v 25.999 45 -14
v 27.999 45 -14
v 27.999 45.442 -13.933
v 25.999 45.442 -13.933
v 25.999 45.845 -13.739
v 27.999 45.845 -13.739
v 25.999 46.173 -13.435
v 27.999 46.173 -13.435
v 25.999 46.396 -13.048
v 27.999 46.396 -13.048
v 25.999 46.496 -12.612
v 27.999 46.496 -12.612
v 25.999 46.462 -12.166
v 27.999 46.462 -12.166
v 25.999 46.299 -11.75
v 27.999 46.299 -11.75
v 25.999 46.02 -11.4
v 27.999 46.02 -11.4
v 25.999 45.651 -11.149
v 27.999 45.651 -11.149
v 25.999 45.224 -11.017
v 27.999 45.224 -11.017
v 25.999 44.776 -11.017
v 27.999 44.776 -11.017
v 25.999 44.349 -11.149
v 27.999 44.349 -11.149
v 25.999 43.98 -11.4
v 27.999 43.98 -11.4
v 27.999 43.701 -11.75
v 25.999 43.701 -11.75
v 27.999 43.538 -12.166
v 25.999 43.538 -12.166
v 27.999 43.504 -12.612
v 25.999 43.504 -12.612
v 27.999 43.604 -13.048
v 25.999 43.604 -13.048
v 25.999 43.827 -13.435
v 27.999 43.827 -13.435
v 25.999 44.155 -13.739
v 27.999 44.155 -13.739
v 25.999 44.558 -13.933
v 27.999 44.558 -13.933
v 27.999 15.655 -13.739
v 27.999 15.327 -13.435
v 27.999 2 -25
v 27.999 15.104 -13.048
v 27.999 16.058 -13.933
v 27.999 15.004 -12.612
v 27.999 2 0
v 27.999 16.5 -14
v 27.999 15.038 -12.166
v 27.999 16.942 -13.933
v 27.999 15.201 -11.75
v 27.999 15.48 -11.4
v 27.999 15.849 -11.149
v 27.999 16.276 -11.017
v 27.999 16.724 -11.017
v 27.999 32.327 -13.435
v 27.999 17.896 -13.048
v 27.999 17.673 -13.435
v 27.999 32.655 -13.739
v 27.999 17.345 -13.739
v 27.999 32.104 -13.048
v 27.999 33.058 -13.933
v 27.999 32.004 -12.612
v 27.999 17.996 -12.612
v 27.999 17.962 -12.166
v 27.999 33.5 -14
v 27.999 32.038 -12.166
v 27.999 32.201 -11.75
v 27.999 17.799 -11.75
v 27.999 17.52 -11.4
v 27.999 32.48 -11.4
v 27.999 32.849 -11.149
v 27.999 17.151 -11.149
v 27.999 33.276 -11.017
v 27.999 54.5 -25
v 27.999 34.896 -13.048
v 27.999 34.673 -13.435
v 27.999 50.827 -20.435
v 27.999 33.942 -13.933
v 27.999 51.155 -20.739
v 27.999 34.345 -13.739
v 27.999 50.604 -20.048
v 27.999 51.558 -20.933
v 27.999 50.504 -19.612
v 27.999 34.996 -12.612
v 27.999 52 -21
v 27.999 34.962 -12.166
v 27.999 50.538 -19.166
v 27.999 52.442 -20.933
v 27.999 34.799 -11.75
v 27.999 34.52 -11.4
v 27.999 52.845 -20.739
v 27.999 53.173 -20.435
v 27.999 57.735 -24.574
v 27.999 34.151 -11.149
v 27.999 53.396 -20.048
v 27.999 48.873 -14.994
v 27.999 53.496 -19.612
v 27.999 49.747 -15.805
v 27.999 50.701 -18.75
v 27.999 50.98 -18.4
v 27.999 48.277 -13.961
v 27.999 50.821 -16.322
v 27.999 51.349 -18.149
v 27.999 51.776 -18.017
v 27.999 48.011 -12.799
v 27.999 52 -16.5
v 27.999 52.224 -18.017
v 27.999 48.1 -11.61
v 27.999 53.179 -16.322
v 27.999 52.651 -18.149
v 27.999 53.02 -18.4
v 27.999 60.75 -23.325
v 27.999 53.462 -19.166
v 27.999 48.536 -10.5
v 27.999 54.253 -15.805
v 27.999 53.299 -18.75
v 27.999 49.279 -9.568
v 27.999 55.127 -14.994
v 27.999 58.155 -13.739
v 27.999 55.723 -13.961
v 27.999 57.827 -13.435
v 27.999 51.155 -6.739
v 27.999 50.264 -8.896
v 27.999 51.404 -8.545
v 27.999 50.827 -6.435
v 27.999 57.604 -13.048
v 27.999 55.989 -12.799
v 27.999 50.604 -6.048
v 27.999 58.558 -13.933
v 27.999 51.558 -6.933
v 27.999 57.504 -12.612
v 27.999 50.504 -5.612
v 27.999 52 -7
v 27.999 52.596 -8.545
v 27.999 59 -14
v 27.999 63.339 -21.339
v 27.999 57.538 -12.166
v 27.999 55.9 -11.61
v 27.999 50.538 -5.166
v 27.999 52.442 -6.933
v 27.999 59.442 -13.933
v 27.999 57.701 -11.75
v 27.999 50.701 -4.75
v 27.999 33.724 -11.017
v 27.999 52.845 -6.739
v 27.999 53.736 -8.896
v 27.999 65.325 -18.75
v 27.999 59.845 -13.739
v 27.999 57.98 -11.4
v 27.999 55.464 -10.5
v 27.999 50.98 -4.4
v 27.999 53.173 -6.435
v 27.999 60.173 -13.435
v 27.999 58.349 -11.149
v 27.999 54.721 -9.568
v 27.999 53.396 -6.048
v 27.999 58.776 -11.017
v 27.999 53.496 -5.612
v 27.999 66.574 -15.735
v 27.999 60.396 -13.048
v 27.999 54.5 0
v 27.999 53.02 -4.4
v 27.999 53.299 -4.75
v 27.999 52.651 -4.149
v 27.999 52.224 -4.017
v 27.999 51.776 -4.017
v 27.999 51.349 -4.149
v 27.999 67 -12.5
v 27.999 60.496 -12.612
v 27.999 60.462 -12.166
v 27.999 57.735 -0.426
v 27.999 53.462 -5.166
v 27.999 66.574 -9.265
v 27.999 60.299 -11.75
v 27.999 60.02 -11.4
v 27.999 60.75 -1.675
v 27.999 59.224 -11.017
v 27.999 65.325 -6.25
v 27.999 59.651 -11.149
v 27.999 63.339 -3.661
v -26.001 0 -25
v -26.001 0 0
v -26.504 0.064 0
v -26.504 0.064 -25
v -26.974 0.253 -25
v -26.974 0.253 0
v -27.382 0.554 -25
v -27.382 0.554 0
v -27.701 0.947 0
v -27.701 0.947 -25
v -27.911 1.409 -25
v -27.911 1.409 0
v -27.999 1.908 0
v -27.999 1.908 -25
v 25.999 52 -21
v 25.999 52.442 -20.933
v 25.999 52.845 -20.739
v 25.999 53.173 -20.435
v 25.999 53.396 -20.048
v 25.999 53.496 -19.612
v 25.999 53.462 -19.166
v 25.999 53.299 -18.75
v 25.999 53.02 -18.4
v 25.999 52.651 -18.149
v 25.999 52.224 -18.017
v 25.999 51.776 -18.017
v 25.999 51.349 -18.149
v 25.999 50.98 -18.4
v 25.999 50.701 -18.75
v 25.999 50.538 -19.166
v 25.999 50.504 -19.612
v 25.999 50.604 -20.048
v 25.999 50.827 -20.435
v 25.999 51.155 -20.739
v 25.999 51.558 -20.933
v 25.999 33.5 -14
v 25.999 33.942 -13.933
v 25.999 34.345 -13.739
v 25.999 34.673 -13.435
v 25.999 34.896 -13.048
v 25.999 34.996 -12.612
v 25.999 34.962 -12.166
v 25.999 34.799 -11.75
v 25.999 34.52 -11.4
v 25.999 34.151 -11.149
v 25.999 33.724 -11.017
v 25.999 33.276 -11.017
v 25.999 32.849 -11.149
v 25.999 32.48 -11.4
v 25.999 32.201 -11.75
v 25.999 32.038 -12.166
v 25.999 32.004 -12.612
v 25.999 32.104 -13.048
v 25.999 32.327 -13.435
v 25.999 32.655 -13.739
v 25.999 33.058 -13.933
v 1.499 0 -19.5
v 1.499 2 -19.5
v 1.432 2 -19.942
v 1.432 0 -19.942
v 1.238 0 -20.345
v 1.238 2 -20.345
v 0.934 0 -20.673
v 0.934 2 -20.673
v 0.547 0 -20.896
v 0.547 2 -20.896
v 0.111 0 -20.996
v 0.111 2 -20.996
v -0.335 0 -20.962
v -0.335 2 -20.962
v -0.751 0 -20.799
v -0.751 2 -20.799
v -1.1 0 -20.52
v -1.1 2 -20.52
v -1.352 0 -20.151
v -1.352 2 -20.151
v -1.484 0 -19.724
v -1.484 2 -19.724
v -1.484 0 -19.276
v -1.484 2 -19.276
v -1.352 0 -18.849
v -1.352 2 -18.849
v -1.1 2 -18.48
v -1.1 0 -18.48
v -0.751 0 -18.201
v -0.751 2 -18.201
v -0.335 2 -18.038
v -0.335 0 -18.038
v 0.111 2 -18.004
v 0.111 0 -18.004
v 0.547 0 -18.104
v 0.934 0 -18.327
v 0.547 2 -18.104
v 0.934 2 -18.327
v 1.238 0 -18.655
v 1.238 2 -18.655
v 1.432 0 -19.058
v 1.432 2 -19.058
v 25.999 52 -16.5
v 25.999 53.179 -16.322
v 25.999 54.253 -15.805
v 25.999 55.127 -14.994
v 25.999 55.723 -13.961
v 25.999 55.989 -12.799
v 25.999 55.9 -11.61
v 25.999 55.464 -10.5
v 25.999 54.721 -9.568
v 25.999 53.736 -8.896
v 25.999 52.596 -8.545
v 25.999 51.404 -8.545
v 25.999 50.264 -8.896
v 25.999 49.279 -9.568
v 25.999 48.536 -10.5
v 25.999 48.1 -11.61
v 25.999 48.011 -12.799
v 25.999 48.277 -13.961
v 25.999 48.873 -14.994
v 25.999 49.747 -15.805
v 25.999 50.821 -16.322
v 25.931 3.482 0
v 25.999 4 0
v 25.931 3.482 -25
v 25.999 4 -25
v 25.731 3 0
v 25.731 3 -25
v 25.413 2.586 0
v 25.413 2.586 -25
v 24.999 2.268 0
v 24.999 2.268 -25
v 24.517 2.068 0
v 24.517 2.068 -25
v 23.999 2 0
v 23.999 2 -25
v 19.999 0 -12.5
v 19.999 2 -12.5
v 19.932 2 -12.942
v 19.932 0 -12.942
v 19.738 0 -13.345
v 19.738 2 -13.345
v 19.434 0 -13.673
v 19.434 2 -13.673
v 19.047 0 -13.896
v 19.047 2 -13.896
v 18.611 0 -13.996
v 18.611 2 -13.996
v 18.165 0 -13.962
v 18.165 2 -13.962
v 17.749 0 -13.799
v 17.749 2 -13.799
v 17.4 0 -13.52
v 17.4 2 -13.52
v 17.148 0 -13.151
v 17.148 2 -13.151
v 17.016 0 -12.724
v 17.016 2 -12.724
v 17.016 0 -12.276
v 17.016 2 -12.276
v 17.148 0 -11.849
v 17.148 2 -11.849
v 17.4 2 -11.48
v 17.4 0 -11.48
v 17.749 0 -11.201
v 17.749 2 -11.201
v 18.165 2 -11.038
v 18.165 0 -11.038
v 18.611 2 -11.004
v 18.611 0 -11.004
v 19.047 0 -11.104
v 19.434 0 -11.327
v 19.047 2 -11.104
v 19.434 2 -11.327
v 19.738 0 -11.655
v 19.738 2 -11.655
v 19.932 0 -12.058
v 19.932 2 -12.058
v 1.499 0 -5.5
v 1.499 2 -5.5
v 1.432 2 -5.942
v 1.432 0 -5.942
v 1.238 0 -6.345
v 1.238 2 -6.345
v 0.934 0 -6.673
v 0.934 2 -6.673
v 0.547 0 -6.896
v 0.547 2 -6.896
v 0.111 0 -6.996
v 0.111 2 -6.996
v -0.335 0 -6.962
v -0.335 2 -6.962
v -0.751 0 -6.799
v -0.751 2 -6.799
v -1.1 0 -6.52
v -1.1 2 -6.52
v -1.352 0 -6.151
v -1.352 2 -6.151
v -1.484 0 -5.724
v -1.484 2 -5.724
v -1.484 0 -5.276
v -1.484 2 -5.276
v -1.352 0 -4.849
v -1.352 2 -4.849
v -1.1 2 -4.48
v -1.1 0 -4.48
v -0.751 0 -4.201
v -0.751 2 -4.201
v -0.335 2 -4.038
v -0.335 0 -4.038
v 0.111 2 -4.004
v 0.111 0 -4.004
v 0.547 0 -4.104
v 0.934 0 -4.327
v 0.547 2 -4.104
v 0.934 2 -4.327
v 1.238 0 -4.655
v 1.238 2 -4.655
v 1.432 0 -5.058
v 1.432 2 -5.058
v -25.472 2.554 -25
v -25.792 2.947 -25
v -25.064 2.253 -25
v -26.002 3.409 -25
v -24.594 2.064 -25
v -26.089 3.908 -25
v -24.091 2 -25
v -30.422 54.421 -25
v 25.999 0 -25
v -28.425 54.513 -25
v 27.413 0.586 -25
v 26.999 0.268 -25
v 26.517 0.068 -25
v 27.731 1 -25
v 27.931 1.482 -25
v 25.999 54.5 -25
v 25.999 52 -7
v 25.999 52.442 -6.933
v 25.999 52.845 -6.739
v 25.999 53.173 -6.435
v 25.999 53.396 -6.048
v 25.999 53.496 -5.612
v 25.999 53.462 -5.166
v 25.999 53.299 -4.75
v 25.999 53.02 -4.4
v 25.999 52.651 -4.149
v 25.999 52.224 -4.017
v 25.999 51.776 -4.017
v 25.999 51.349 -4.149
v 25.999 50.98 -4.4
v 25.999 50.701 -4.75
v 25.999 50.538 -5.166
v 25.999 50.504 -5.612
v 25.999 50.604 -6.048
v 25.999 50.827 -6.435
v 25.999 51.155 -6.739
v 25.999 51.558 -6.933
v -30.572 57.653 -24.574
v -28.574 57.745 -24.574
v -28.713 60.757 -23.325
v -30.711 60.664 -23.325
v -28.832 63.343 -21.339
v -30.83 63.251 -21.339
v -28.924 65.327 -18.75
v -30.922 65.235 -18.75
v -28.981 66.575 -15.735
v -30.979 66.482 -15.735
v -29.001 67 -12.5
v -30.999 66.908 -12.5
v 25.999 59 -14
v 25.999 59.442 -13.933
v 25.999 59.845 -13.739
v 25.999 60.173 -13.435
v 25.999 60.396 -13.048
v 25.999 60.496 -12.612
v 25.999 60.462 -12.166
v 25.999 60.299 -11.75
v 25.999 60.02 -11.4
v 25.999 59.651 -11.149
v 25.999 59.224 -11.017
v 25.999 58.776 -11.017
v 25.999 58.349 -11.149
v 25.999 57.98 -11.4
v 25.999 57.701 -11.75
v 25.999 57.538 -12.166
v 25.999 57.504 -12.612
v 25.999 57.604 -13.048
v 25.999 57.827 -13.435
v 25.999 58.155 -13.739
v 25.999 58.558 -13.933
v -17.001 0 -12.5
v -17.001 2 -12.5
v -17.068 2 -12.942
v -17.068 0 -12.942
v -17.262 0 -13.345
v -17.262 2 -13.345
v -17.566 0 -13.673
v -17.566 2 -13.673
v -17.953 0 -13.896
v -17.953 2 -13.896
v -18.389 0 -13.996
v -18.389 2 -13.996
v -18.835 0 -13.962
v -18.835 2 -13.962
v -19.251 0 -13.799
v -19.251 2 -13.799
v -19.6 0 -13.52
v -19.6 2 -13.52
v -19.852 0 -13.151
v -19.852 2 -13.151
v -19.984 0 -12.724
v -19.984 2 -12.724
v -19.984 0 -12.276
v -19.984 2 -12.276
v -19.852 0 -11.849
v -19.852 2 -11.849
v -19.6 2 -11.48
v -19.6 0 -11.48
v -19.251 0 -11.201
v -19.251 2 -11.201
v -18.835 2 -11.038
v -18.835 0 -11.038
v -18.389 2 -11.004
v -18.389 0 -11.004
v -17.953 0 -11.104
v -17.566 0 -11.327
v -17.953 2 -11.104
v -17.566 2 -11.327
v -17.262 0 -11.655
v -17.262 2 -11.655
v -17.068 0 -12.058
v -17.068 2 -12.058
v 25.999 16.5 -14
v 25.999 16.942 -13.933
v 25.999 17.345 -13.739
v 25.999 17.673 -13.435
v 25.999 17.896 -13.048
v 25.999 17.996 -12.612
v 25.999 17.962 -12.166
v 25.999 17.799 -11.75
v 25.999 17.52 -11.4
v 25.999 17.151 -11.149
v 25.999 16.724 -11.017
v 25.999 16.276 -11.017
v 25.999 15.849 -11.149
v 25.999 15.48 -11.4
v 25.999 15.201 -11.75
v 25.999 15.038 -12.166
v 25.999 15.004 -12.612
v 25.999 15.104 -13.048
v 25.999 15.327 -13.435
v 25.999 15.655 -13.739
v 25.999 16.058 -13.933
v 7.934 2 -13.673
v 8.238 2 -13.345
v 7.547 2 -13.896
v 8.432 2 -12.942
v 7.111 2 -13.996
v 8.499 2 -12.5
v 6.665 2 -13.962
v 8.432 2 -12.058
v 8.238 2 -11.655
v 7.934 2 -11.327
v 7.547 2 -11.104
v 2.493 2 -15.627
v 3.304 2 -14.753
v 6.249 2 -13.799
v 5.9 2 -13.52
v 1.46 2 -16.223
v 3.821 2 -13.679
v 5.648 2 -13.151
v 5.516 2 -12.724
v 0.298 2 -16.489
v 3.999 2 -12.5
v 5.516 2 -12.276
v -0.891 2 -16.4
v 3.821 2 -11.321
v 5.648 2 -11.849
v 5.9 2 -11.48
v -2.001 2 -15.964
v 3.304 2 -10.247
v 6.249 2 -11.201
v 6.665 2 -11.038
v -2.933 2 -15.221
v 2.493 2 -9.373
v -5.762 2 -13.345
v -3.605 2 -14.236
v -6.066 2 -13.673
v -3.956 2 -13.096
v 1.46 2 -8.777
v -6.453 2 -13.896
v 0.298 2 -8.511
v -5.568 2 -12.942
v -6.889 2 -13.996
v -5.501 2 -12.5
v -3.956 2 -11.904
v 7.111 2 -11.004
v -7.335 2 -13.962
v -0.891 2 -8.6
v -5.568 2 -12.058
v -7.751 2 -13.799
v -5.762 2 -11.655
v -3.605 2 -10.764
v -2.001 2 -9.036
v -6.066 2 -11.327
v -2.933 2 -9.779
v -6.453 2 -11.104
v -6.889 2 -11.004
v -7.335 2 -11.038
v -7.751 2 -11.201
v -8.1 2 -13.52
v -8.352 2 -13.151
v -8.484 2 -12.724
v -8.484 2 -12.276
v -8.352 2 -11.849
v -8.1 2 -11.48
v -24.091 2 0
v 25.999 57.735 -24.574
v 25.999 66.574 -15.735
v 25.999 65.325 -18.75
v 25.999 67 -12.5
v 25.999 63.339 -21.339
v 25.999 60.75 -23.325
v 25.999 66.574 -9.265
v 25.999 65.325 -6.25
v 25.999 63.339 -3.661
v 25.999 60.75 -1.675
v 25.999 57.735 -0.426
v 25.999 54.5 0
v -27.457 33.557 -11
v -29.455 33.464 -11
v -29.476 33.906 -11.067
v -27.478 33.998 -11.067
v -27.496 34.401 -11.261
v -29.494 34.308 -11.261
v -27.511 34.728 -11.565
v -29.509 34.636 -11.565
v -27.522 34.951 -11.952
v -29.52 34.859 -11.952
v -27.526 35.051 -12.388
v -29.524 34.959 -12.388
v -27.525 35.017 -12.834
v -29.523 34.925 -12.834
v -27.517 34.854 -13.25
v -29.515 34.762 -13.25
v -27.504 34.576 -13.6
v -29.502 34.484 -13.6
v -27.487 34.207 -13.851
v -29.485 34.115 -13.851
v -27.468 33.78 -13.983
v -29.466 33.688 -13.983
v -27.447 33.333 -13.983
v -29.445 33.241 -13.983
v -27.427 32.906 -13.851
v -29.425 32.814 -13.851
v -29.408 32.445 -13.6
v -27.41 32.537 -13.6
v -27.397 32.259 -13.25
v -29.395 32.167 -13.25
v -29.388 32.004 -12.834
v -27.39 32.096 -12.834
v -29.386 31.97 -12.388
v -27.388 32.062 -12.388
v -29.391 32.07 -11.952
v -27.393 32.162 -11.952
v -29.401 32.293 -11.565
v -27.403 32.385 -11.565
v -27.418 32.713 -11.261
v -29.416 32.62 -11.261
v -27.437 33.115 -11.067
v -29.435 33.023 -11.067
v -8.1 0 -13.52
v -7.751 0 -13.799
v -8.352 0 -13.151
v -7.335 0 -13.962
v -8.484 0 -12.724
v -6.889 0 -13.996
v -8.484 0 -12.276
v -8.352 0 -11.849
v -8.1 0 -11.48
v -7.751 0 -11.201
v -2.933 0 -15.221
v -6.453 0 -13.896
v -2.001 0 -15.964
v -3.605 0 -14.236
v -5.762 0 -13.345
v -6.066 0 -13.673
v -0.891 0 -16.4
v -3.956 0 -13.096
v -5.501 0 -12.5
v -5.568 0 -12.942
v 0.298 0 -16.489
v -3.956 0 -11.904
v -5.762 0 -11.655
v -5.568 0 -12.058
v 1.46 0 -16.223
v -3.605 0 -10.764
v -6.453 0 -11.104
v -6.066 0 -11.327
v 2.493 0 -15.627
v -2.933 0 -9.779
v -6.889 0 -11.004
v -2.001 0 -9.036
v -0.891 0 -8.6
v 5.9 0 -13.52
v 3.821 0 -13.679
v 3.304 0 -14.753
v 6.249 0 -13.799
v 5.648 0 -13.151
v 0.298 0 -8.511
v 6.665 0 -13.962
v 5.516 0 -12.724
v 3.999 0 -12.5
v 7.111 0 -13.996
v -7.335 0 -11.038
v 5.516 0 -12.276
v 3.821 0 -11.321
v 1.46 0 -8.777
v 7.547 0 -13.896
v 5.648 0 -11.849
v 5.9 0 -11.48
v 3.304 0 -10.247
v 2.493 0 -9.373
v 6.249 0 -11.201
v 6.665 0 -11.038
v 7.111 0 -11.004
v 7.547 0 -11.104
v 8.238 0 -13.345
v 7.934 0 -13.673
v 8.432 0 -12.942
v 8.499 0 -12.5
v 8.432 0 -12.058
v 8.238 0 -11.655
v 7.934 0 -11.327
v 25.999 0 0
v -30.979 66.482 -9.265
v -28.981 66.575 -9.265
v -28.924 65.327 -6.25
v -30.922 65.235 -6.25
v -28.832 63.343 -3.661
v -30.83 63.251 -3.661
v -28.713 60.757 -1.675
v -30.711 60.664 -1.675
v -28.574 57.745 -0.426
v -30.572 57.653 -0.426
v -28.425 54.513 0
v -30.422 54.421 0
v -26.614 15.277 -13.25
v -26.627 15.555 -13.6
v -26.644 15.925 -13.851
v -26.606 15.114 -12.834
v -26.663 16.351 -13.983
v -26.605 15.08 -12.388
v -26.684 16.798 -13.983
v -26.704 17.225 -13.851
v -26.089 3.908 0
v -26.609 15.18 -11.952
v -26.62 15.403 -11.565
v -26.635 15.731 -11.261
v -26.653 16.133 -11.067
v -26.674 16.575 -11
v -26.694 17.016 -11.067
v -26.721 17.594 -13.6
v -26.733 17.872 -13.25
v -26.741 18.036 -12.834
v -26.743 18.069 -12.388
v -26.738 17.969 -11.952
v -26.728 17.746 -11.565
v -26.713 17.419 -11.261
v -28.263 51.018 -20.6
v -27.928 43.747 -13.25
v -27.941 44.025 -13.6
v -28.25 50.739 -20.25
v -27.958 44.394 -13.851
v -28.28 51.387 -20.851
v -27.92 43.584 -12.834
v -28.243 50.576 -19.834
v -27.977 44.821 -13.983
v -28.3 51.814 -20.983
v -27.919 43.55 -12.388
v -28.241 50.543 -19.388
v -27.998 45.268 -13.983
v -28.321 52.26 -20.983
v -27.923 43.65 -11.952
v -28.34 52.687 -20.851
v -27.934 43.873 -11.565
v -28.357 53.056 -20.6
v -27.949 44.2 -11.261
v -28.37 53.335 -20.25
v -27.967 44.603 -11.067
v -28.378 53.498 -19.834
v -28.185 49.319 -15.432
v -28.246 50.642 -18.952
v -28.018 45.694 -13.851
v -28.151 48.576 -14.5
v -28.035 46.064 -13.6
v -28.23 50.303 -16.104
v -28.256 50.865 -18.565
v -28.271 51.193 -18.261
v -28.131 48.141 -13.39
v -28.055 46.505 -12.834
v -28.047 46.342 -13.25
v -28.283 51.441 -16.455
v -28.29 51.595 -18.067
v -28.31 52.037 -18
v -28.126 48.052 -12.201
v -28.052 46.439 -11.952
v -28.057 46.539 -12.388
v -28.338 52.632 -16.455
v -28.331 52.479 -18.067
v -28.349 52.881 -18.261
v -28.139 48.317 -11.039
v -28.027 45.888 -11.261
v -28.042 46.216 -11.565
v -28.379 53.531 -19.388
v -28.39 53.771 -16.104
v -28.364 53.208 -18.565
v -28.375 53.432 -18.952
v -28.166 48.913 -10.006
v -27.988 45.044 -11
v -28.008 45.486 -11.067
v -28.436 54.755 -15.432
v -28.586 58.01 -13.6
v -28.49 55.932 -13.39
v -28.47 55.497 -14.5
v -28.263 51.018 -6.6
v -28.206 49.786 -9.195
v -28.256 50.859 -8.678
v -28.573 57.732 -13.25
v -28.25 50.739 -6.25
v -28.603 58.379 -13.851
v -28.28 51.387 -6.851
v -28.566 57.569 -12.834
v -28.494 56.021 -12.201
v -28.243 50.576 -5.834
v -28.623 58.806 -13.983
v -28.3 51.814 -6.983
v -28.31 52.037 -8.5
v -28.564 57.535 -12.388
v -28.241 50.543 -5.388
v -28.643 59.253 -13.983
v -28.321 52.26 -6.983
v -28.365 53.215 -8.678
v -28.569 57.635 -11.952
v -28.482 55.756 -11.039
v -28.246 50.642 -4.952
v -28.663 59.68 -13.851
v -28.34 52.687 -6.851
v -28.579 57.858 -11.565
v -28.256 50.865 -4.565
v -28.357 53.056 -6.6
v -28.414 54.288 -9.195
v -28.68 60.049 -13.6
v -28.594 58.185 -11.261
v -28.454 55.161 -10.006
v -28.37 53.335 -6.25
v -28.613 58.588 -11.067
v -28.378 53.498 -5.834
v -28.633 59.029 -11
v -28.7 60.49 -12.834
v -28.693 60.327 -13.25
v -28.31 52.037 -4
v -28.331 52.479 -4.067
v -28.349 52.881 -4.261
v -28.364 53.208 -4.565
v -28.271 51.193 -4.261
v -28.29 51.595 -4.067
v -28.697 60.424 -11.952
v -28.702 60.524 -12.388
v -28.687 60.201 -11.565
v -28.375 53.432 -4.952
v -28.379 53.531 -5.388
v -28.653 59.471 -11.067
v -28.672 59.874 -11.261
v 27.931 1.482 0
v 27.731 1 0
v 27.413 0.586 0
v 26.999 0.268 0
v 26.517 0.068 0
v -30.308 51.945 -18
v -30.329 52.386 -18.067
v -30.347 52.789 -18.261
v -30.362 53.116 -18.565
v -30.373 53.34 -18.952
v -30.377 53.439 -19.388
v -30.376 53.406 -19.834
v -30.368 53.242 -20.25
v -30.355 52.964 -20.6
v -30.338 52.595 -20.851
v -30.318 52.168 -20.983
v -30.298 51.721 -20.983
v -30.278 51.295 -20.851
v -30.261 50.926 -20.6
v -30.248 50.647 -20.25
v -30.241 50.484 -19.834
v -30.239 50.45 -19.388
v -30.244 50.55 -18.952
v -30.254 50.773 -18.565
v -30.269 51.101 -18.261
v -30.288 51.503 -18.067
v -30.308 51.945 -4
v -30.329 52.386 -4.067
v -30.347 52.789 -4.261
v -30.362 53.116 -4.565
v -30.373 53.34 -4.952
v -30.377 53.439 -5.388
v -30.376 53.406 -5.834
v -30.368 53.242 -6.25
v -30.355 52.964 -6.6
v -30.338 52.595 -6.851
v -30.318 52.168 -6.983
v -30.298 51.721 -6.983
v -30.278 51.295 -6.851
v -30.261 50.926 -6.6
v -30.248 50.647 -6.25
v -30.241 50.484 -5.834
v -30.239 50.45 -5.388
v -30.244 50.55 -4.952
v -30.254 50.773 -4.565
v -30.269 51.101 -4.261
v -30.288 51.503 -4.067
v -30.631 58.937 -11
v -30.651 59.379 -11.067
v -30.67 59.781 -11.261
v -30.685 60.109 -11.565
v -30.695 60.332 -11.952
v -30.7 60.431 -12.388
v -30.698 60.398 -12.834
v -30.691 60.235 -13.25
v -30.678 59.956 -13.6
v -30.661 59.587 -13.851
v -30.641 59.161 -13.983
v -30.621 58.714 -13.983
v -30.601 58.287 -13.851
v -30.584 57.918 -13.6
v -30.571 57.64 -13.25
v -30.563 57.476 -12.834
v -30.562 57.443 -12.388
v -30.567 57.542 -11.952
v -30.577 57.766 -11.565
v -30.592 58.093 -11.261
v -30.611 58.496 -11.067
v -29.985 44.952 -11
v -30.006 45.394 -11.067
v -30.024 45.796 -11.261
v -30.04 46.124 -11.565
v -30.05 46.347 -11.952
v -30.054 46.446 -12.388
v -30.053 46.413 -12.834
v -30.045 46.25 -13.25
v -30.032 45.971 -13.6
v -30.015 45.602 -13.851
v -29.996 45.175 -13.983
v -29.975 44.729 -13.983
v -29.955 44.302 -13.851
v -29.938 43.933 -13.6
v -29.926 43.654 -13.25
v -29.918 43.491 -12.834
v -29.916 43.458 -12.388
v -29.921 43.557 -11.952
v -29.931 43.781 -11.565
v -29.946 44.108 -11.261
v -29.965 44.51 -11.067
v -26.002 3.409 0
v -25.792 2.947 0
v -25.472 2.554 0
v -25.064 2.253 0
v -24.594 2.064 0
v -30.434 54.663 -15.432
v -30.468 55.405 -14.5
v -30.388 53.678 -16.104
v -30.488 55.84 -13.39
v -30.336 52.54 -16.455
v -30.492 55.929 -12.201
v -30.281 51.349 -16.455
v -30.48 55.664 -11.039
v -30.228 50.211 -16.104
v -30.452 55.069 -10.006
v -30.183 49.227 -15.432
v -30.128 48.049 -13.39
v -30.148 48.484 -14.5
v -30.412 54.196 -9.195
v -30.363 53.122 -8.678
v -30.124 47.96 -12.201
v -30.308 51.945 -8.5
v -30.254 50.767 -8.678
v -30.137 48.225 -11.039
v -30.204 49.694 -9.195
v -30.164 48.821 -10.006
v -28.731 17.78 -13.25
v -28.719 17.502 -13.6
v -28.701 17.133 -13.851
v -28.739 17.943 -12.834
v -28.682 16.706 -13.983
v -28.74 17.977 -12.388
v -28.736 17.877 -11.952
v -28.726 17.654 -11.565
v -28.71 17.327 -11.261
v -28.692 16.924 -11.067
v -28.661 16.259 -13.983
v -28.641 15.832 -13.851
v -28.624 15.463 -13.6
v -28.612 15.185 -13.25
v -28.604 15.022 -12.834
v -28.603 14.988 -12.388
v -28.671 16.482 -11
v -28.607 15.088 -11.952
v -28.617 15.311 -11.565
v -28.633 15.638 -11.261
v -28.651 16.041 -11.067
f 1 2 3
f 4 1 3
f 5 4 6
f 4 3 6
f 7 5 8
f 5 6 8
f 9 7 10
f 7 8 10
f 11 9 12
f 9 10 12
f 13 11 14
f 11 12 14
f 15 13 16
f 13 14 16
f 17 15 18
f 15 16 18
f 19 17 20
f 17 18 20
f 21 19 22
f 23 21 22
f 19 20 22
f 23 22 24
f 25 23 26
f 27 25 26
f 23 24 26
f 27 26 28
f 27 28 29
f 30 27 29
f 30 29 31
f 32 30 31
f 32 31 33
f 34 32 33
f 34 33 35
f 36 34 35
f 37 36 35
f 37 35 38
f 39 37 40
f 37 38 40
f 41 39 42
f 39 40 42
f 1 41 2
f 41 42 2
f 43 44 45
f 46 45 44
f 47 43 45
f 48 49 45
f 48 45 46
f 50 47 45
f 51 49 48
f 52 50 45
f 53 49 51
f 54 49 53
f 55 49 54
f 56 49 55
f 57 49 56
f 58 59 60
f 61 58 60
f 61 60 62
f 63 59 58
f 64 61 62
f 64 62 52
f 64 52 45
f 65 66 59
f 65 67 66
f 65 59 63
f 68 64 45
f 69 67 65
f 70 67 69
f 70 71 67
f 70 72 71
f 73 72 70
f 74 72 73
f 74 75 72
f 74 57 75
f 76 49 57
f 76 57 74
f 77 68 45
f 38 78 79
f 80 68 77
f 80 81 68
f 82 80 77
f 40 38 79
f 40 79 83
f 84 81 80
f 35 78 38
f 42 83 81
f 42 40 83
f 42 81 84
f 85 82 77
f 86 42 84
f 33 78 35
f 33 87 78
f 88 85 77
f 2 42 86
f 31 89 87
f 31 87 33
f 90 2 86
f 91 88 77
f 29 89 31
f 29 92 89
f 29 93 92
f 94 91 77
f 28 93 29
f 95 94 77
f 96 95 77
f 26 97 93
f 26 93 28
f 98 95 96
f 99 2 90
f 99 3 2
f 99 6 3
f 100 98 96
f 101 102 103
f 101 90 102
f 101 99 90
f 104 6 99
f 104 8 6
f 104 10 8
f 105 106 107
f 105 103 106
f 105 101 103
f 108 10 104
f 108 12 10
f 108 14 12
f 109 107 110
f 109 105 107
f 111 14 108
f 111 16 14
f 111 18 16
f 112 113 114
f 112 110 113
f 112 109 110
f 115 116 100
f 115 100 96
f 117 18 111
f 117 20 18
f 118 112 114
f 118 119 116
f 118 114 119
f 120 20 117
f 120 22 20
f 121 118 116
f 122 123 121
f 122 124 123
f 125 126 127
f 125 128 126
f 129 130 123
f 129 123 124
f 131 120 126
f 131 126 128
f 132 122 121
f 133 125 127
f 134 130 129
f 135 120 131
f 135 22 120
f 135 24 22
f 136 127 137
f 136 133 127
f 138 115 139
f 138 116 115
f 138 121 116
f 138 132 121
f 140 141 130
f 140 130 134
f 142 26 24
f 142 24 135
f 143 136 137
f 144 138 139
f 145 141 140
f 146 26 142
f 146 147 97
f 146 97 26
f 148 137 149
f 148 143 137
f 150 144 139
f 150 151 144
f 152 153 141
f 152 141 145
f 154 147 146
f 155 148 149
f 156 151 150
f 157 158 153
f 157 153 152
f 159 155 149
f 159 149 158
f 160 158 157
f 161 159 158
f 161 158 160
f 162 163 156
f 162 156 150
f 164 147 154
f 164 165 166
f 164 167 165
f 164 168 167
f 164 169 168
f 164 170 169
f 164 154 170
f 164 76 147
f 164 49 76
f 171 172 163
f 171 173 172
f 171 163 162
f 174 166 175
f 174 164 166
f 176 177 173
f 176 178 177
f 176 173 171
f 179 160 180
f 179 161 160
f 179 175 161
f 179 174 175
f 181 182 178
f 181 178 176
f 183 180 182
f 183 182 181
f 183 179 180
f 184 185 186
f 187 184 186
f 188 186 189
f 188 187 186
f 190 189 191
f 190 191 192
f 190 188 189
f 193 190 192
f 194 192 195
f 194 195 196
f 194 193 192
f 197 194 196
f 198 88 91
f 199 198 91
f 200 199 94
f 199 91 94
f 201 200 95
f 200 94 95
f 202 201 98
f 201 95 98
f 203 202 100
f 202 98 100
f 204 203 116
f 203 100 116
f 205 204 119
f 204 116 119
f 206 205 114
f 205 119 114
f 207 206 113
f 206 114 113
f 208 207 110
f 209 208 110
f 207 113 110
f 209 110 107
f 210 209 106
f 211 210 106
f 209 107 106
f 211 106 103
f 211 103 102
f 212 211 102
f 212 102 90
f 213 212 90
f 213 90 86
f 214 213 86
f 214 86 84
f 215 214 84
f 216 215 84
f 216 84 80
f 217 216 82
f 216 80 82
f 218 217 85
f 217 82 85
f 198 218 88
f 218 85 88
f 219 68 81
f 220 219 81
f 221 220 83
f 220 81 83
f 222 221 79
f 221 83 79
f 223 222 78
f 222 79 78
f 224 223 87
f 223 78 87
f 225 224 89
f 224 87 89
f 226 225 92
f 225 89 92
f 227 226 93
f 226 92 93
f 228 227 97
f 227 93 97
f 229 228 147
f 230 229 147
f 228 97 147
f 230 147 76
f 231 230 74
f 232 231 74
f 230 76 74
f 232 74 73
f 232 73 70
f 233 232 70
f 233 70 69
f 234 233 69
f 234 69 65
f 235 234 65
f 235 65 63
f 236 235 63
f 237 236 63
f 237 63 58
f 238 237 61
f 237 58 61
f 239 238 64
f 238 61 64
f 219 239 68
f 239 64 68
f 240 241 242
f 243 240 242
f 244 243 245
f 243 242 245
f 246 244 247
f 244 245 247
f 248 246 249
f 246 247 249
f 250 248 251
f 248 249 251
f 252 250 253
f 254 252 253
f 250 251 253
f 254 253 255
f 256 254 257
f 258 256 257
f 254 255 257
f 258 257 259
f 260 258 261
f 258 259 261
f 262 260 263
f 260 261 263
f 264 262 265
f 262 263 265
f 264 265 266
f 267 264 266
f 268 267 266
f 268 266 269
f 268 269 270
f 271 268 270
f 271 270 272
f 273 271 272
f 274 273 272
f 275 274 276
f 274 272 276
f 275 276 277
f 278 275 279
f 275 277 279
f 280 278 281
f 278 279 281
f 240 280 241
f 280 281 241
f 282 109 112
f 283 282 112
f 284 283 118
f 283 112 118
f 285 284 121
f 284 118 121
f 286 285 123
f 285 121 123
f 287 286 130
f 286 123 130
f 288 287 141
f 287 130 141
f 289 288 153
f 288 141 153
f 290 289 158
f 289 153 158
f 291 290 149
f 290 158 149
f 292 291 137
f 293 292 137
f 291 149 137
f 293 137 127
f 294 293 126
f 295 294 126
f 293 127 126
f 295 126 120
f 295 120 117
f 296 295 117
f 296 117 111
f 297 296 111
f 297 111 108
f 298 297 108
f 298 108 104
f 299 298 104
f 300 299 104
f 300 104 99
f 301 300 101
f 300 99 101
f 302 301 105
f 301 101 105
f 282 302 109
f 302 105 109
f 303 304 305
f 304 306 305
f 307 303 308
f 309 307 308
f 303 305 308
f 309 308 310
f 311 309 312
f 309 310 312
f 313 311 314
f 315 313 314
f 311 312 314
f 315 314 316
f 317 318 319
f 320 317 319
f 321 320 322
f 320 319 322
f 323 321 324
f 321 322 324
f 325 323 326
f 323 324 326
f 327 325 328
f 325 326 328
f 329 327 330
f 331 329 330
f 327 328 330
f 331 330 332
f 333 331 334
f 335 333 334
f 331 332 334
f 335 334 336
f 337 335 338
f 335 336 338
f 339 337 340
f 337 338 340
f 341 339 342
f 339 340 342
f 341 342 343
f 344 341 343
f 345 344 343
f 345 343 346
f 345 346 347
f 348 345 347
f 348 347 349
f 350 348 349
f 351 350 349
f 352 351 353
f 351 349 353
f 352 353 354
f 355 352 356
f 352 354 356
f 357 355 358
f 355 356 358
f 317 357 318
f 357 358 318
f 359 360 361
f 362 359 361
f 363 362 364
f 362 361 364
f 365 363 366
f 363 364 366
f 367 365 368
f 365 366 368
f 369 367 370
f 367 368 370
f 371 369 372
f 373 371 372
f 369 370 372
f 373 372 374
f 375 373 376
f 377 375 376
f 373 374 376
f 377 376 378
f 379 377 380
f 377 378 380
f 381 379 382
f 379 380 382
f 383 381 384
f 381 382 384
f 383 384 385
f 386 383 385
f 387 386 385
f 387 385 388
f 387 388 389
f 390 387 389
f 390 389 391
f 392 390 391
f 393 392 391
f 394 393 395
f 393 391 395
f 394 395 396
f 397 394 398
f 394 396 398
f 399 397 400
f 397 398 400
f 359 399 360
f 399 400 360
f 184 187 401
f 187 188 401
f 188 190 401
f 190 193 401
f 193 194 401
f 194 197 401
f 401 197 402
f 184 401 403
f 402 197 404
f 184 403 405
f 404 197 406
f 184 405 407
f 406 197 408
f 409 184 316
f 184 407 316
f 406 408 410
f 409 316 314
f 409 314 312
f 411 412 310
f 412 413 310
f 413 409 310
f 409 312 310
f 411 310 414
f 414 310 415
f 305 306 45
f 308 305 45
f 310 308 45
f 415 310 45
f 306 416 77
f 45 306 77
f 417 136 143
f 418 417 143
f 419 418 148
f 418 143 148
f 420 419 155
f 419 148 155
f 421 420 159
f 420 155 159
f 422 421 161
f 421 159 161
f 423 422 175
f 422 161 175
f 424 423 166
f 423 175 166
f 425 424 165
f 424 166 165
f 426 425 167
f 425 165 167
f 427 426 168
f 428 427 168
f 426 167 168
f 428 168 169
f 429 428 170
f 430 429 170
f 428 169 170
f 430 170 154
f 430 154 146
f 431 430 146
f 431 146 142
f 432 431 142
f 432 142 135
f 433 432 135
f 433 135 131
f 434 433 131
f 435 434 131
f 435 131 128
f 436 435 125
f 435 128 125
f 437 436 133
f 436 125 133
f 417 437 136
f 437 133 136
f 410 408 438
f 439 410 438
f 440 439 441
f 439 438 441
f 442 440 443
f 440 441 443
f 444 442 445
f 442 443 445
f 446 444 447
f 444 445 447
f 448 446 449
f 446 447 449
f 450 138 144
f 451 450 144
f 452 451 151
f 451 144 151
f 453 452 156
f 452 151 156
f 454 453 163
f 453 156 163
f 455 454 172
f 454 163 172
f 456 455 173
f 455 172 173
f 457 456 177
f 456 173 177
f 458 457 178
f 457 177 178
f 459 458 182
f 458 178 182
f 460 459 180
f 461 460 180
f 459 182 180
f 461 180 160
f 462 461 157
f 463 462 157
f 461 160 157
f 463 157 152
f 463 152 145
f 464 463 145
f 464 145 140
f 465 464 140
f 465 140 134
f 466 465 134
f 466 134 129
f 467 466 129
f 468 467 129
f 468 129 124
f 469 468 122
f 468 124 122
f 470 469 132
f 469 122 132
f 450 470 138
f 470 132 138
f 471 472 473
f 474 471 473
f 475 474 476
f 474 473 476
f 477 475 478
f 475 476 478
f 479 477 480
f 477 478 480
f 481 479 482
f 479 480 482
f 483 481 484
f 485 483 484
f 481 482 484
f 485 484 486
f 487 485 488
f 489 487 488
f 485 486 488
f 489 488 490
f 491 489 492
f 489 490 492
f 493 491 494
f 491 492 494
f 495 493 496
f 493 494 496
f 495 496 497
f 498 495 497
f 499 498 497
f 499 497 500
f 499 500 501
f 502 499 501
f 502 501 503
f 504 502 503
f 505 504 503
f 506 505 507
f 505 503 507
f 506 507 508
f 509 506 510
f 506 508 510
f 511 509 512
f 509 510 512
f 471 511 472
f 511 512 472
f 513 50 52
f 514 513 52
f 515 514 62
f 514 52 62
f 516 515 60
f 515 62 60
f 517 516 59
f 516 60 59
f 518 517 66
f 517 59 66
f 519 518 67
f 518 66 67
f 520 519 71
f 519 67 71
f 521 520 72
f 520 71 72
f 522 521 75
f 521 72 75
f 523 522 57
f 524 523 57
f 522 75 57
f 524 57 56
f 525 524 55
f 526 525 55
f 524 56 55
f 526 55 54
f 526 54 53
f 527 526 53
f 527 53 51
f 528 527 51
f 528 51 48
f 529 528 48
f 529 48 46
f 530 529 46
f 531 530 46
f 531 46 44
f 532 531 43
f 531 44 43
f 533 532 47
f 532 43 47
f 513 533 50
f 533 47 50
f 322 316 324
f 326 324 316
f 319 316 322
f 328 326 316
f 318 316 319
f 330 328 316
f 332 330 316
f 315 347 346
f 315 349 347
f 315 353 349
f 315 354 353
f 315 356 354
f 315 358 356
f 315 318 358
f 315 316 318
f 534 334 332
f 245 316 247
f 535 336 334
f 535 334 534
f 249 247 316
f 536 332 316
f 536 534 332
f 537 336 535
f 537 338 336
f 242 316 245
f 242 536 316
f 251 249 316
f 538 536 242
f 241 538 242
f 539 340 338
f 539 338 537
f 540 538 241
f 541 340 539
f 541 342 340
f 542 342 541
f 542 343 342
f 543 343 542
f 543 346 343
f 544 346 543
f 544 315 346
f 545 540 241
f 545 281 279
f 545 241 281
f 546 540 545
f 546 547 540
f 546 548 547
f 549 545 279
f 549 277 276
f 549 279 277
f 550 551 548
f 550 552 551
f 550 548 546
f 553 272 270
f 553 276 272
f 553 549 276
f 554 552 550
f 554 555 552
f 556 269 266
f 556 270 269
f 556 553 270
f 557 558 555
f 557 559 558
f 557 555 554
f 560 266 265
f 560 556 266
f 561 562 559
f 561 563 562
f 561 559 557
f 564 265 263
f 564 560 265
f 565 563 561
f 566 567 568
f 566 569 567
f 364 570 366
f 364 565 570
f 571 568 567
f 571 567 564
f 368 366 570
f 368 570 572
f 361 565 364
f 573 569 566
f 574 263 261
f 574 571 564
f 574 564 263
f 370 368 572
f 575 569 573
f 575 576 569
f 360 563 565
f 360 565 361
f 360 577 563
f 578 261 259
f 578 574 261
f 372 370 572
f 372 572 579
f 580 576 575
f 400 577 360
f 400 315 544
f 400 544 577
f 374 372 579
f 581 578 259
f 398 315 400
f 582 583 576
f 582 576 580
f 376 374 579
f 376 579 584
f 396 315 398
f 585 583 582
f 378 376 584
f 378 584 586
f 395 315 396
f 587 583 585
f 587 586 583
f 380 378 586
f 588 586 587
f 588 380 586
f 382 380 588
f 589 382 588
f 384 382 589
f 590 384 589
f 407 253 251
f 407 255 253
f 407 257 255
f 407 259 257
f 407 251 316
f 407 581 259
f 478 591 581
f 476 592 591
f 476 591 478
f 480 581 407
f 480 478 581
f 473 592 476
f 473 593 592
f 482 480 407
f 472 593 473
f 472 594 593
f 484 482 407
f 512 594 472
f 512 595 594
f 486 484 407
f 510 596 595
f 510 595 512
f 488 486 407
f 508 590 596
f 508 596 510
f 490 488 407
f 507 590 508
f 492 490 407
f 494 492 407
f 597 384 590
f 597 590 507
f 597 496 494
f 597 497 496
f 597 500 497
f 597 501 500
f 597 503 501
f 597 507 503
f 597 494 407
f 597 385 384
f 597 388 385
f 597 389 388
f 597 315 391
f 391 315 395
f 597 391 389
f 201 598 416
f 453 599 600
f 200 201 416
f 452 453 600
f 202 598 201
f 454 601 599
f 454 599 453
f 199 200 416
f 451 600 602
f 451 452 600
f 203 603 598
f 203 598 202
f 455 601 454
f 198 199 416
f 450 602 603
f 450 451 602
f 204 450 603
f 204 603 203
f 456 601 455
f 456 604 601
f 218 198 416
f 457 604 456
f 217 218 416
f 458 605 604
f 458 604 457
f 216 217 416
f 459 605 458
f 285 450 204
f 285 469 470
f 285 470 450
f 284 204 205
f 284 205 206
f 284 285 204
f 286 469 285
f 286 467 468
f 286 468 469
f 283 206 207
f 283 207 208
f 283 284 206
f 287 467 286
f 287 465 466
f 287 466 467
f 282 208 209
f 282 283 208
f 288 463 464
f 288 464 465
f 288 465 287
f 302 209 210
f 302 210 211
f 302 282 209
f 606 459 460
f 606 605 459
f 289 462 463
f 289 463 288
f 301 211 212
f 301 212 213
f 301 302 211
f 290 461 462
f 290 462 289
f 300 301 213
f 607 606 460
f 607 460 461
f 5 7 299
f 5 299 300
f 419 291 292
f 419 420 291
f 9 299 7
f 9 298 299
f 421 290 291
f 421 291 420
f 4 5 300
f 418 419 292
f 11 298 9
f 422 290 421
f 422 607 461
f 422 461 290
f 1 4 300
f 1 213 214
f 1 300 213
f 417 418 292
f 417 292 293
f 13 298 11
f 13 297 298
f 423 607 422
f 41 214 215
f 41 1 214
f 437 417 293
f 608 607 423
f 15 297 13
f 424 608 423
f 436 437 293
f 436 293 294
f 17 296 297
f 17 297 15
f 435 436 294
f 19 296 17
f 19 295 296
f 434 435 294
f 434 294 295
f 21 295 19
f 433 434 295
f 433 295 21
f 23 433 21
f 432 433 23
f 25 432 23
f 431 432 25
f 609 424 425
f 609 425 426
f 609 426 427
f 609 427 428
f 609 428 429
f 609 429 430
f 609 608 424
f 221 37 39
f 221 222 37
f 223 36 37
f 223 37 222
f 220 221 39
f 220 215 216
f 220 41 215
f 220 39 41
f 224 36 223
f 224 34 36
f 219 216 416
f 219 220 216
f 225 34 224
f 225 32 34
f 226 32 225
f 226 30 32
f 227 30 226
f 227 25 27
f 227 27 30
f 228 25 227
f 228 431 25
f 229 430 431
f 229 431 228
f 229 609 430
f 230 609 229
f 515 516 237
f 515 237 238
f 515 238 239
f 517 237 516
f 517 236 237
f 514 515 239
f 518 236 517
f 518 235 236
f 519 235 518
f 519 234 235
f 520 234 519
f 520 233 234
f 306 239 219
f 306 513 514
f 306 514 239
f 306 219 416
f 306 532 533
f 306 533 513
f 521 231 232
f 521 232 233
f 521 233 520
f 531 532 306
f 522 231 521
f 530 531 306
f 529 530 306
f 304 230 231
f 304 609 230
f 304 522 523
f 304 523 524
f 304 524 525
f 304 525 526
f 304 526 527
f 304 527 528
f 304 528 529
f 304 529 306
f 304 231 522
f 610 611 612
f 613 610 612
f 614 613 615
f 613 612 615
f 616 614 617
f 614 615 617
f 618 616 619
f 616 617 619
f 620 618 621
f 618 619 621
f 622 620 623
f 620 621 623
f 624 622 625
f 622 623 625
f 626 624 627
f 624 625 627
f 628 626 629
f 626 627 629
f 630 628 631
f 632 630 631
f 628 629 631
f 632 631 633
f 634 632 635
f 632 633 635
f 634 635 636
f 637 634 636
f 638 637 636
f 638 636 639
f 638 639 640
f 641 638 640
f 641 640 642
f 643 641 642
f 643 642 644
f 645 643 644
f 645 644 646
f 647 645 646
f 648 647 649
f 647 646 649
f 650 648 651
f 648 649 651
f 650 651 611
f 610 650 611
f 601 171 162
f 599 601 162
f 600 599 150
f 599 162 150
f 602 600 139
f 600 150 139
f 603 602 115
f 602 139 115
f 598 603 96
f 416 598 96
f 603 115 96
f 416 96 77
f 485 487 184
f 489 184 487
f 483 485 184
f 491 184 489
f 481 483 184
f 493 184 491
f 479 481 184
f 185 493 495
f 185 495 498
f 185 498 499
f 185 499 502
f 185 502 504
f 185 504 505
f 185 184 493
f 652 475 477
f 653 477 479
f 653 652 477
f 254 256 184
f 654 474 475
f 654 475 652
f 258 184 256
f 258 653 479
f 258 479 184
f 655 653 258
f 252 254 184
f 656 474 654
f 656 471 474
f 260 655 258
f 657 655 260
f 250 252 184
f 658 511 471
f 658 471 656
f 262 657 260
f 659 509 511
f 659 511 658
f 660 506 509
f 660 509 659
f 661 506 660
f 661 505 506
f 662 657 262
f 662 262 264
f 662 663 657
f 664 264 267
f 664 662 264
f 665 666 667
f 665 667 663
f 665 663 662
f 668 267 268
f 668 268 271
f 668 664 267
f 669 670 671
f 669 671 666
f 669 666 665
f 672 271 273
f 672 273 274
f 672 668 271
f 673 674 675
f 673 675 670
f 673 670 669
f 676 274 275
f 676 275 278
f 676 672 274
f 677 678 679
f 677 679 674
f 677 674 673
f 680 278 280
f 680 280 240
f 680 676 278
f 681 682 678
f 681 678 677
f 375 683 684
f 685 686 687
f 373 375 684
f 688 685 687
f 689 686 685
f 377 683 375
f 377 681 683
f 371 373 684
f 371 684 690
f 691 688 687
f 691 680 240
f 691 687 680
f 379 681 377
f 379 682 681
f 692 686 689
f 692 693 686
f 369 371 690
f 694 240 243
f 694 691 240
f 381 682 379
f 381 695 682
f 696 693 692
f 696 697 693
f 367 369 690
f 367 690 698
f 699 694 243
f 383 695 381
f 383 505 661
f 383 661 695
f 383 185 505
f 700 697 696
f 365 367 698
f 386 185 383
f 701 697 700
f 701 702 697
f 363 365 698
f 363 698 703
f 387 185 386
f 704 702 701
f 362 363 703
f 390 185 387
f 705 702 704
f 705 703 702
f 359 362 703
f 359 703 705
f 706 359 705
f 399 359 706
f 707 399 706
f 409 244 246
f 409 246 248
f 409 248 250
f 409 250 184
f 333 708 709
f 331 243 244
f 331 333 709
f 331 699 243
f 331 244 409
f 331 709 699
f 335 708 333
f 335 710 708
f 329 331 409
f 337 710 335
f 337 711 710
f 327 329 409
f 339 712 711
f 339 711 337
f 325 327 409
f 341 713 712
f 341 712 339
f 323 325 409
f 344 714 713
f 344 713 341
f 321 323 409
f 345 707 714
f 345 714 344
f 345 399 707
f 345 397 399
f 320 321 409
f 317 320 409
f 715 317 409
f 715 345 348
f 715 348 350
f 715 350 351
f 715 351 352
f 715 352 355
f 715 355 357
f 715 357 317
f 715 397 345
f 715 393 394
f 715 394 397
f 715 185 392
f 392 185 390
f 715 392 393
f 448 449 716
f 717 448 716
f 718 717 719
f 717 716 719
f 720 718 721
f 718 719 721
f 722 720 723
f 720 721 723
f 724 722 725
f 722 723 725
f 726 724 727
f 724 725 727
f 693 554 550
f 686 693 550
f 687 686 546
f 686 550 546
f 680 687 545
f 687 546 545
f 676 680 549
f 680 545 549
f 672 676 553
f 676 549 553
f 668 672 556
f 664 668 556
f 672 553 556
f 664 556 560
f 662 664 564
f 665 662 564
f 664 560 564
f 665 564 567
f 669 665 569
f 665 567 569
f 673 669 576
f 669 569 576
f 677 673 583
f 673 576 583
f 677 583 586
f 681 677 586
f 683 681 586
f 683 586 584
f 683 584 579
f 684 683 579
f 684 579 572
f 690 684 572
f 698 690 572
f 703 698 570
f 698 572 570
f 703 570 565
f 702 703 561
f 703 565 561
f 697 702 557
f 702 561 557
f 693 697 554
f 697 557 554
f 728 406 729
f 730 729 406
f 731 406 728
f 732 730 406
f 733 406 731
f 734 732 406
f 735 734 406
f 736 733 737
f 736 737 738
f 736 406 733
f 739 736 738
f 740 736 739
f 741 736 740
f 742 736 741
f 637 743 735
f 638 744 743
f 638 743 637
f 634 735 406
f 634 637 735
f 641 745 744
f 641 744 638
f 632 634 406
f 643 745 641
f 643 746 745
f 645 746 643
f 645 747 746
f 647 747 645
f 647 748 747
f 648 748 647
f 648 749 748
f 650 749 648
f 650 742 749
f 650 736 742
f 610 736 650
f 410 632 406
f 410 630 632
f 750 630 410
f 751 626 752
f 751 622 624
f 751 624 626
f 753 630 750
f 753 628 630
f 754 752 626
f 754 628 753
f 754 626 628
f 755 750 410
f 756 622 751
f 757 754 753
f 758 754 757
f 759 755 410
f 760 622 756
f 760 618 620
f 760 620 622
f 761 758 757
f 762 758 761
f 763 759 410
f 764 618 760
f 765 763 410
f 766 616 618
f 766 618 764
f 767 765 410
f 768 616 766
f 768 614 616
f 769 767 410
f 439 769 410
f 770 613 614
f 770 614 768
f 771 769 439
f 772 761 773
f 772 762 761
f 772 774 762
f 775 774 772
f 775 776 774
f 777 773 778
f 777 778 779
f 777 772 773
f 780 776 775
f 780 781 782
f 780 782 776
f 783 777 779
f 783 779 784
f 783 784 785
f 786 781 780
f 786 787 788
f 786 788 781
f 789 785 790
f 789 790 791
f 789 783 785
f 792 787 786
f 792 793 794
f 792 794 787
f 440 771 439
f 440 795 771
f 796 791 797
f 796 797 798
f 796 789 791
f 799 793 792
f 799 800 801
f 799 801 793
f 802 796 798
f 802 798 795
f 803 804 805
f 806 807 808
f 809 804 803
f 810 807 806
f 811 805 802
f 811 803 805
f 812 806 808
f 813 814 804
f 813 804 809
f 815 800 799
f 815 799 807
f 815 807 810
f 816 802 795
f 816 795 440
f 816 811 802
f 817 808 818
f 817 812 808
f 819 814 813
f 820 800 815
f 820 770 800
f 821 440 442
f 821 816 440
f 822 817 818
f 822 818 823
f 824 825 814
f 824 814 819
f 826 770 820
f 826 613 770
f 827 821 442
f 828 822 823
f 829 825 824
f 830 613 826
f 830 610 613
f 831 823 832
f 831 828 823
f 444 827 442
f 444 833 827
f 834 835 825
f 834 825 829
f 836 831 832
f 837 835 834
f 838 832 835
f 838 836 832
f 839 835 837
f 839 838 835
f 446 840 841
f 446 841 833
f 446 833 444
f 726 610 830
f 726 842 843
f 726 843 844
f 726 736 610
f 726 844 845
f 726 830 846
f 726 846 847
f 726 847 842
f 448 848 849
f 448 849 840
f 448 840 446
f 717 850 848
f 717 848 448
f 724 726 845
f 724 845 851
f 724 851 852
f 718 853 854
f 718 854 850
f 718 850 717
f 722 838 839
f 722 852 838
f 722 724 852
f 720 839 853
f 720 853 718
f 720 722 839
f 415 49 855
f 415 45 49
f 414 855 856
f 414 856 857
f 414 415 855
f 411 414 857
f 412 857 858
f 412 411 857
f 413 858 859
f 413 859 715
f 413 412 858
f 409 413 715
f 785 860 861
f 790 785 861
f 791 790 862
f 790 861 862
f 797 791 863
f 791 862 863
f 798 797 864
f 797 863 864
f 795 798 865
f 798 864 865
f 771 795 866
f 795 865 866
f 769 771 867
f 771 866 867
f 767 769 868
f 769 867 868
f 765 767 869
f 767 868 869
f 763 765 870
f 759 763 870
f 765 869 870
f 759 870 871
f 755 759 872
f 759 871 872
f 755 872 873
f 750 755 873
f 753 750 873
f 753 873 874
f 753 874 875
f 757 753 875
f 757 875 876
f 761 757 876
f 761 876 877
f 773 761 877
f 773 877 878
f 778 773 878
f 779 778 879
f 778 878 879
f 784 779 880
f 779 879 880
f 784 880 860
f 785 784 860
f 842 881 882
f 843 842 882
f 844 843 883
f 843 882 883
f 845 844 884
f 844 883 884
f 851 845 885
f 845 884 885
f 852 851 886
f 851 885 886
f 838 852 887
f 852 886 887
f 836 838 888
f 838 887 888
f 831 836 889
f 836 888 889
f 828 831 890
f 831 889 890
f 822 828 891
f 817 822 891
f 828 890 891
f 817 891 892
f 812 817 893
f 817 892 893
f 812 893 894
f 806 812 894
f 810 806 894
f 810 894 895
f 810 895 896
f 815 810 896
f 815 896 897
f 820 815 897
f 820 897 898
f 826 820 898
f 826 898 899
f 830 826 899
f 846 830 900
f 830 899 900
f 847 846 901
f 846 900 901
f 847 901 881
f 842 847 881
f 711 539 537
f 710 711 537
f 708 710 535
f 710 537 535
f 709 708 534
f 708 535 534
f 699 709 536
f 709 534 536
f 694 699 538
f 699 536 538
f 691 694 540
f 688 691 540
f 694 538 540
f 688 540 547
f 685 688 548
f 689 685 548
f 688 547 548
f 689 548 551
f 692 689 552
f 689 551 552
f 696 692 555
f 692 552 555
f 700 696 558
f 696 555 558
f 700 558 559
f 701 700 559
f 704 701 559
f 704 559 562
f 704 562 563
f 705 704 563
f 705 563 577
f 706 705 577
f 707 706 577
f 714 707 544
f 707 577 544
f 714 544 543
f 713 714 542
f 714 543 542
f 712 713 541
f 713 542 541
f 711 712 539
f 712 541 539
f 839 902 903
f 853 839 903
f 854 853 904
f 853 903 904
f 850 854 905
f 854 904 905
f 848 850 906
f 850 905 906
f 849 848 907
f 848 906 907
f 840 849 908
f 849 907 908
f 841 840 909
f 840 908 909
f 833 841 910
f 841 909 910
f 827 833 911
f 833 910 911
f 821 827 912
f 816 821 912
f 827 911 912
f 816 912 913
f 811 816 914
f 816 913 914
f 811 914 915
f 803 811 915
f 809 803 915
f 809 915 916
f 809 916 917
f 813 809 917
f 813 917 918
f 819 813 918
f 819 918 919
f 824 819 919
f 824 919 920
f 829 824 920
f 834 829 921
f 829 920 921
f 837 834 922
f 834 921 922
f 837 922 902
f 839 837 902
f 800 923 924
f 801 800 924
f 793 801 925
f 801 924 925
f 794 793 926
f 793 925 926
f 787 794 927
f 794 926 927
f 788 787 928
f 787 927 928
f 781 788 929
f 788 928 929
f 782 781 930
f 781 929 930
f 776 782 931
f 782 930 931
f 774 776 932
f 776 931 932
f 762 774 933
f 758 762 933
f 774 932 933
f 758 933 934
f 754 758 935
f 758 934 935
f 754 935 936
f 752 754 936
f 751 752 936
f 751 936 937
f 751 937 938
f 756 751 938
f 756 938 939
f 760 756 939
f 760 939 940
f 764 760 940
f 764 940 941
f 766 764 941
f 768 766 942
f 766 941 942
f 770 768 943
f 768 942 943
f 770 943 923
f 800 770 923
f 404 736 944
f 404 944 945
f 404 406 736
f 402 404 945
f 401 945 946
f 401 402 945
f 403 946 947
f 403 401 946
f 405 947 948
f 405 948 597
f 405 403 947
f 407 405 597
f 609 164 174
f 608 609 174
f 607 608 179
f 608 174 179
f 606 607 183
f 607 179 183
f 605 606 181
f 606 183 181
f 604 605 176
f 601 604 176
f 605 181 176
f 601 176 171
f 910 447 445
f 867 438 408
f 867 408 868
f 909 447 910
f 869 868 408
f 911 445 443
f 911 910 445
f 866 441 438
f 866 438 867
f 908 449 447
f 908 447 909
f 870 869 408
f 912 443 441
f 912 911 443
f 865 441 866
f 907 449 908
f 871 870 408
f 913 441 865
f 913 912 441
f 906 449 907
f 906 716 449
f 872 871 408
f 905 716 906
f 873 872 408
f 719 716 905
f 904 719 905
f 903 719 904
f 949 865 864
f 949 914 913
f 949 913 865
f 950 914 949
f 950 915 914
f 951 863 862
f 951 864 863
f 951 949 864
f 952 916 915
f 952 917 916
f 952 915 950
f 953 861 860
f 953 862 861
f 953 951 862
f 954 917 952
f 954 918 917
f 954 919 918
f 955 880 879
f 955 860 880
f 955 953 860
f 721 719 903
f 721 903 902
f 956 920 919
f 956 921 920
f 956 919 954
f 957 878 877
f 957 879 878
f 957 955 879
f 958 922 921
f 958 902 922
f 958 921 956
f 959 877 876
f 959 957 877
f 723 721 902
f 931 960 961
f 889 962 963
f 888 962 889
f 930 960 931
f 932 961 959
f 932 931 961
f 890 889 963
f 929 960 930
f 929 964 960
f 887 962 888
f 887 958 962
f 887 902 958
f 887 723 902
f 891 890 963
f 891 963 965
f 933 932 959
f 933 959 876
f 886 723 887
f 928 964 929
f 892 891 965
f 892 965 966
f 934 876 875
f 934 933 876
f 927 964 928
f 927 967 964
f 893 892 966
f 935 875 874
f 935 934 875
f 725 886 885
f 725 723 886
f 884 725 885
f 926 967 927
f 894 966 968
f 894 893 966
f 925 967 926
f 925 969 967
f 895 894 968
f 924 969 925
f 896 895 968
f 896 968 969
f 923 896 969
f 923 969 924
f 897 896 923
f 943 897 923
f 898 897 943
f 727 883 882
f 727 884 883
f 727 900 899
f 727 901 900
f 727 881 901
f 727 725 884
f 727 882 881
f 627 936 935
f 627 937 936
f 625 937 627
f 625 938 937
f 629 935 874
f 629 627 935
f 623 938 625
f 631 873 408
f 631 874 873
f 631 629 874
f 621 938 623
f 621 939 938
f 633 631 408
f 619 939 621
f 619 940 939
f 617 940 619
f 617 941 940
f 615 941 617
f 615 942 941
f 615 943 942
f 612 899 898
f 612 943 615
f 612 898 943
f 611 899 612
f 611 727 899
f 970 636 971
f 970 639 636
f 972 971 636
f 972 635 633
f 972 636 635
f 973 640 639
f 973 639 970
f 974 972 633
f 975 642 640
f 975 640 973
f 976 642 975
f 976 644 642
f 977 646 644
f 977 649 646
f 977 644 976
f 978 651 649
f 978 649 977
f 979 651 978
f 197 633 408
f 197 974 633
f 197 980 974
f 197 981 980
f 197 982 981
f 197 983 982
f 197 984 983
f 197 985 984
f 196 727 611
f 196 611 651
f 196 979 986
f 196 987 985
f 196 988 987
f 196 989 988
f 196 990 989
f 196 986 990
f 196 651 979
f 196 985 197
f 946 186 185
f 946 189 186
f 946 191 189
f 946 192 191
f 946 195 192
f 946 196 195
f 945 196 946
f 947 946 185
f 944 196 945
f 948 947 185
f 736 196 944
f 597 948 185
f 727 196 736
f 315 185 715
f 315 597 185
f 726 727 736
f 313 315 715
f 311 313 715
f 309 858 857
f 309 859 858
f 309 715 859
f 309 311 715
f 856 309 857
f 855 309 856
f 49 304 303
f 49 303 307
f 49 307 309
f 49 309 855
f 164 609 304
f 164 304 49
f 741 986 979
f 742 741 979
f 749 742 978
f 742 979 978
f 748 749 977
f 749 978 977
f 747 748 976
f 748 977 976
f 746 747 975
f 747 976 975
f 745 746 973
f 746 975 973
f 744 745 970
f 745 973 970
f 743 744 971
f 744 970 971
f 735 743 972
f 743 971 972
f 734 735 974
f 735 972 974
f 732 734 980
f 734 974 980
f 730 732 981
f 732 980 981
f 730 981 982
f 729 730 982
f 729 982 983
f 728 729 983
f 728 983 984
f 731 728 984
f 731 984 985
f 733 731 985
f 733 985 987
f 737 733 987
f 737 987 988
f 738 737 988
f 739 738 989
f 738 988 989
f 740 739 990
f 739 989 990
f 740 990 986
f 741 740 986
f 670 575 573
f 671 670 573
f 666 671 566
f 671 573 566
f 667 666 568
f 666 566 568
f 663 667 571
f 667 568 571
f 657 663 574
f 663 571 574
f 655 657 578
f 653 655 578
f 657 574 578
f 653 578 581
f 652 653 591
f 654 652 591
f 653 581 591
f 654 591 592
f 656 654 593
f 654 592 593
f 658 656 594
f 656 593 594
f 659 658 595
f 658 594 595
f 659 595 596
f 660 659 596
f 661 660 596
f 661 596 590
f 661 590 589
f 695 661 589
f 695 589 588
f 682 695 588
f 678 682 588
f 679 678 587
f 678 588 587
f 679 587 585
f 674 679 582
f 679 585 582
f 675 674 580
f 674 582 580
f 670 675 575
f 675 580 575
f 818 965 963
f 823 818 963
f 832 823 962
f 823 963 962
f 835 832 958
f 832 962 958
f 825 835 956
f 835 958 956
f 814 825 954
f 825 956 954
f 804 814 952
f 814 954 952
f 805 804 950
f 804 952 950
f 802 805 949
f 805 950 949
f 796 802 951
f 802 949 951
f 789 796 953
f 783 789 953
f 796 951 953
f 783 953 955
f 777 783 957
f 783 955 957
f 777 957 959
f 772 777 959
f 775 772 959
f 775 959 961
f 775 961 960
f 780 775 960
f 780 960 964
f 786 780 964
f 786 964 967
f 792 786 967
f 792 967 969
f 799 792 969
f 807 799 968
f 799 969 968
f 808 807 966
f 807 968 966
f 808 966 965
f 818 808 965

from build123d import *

# Parameters (mm, degrees)
BOSS_EXTRUDE1_DEPTH = 25
SKETCH4_R           = 4
SKETCH4_R_2         = 1.5
CUT_EXTRUDE3_DEPTH  = 2
SKETCH5_R           = 1.5
SKETCH5_R_2         = 4
CUT_EXTRUDE4_DEPTH  = 2
SKETCH6_R           = 4
SKETCH6_R_2         = 1.5
CUT_EXTRUDE5_DEPTH  = 2
FILLET2_R           = 2


with BuildPart() as part:
    # Sketch1 → Boss-Extrude1 (new body)
    with BuildSketch(Plane.XY):
        Polygon((27.999082786, 67), (25.999082786, 67), (25.999082786, 2), (-26.000917214, 2), (-29.000917214, 67), (-30.998790434, 66.907790467), (-27.910738566, 0), (-26.000917214, 0), (27.999082786, 0), align=None)
    extrude(amount=-BOSS_EXTRUDE1_DEPTH)

    # Sketch4 → Cut-Extrude3 (cut)
    with BuildSketch(Plane(origin=(-27.851410119, -1.285449698, 0), x_dir=(0, 0, 1), z_dir=(-0.99893661, -0.046104767, 0))):
        with BuildLine():
            Line((0, 68.265833379), (-12.5, 68.265833379))
            ThreePointArc((-12.5, 68.265833379), (-3.661165235, 64.604668144), (0, 55.765833379))
            Line((0, 55.765833379), (0, 68.265833379))
        make_face()
        with BuildLine():
            Line((-25, 68.265833379), (-25, 55.765833379))
            ThreePointArc((-25, 55.765833379), (-21.338834765, 64.604668144), (-12.5, 68.265833379))
            Line((-12.5, 68.265833379), (-25, 68.265833379))
        make_face()
        with Locations((-12.5, 53.286818087)):
            Circle(SKETCH4_R)
        with Locations((-12.5, 34.786818087)):
            Circle(SKETCH4_R_2)
        with Locations((-12.5, 17.786818087)):
            Circle(SKETCH4_R_2)
        with Locations((-12.5, 46.286818087)):
            Circle(SKETCH4_R_2)
        with Locations((-19.5, 53.286818087)):
            Circle(SKETCH4_R_2)
        with Locations((-12.5, 60.286818087)):
            Circle(SKETCH4_R_2)
        with Locations((-5.5, 53.286818087)):
            Circle(SKETCH4_R_2)
    extrude(amount=-CUT_EXTRUDE3_DEPTH, mode=Mode.SUBTRACT)

    # Sketch5 → Cut-Extrude4 (cut)
    with BuildSketch(Plane(origin=(27.999082786, 0, 0), x_dir=(0, 0, -1), z_dir=(1, 0, 0))):
        with BuildLine():
            Line((0, 67), (0, 54.5))
            ThreePointArc((0, 54.5), (3.661165235, 63.338834765), (12.5, 67))
            Line((12.5, 67), (0, 67))
        make_face()
        with BuildLine():
            Line((25, 67), (12.5, 67))
            ThreePointArc((12.5, 67), (21.338834765, 63.338834765), (25, 54.5))
            Line((25, 54.5), (25, 67))
        make_face()
        with Locations((12.5, 59)):
            Circle(SKETCH5_R)
        with Locations((19.5, 52)):
            Circle(SKETCH5_R)
        with Locations((12.5, 45)):
            Circle(SKETCH5_R)
        with Locations((5.5, 52)):
            Circle(SKETCH5_R)
        with Locations((12.5, 33.5)):
            Circle(SKETCH5_R)
        with Locations((12.5, 16.5)):
            Circle(SKETCH5_R)
        with Locations((12.5, 52)):
            Circle(SKETCH5_R_2)
    extrude(amount=-CUT_EXTRUDE4_DEPTH, mode=Mode.SUBTRACT)

    # Sketch6 → Cut-Extrude5 (cut)
    with BuildSketch(Plane(origin=(0, 2, 0), x_dir=(1, 0, 0), z_dir=(0, 1, 0))):
        with Locations((-0.000917214, 12.5)):
            Circle(SKETCH6_R)
        with Locations((-7.000917214, 12.5)):
            Circle(SKETCH6_R_2)
        with Locations((-0.000917214, 19.5)):
            Circle(SKETCH6_R_2)
        with Locations((6.999082786, 12.5)):
            Circle(SKETCH6_R_2)
        with Locations((-0.000917214, 5.5)):
            Circle(SKETCH6_R_2)
        with Locations((18.499082786, 12.5)):
            Circle(SKETCH6_R_2)
        with Locations((-18.500917214, 12.5)):
            Circle(SKETCH6_R_2)
    extrude(amount=-CUT_EXTRUDE5_DEPTH, mode=Mode.SUBTRACT)

    # Fillet2
    fillet2_edges = [part.edges().sort_by_distance(p)[0] for p in [
        (-27.910738566, 0, -12.5),
        (-26.000917214, 2, -12.5),
        (25.999082786, 2, -12.5),
        (27.999082786, 0, -12.5),
    ]]
    fillet(fillet2_edges, radius=FILLET2_R)


solid = part.part
